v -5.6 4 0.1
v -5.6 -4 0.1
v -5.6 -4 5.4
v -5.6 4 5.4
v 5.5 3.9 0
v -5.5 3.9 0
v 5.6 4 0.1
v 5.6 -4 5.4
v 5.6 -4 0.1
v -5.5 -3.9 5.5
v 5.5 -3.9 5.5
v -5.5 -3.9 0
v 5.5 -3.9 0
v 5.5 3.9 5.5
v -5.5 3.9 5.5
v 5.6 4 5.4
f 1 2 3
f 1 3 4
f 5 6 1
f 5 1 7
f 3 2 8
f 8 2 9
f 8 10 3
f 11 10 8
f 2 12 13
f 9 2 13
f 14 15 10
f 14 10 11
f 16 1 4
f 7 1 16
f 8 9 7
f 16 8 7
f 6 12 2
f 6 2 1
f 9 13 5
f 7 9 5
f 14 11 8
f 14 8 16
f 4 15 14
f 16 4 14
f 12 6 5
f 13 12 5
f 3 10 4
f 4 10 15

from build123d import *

# Parameters (mm, degrees)
ESQUISSE1_W        = 11.2
ESQUISSE1_H        = 8
BOSS_EXTRU_1_DEPTH = 5.5
CHANFREIN1_SIZE    = 0.1


with BuildPart() as part:
    # Esquisse1 → Boss.-Extru.1 (new body)
    with BuildSketch(Plane.XY):
        Rectangle(ESQUISSE1_W, ESQUISSE1_H)
    extrude(amount=BOSS_EXTRU_1_DEPTH)

    # Chanfrein1
    chanfrein1_edges = [part.edges().sort_by_distance(p)[0] for p in [
        (5.6, 0, 5.5),
        (0, 4, 5.5),
        (-5.6, 0, 5.5),
        (0, 4, 0),
        (5.6, 0, 0),
        (0, -4, 0),
        (-5.6, 0, 0),
        (0, -4, 5.5),
    ]]
    chamfer(chanfrein1_edges, length=CHANFREIN1_SIZE)


solid = part.part
